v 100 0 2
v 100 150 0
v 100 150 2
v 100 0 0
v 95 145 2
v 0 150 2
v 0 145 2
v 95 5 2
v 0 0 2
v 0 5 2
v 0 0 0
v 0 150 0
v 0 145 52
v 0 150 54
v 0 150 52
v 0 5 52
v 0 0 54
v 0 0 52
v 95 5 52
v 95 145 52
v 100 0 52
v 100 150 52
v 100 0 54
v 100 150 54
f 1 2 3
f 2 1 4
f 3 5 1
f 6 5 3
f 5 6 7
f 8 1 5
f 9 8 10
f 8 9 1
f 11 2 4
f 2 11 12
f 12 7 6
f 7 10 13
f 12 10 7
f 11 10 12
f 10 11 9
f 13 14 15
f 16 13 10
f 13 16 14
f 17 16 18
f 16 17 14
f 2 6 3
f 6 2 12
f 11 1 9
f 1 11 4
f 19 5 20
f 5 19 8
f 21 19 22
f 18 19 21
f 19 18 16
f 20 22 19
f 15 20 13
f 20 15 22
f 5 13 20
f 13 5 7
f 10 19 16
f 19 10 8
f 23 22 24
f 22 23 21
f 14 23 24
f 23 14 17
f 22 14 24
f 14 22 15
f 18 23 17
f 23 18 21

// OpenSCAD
//Customizable Book - to demonstrate basics of OpenSCAD for the Open Source Lab book
// Right now most 3d printers can only print 1 color -- soon you will be able to map the attached image onto this book design.

//Width of book
w=100; 
// Length of book
l=150; 
//Cover thicknes of book
c= 2;  
//Thickness of book
t= 50; 
// Page inset
i=5; 

module book (){
cube([w,l,c]); //book cover
translate([0,i,c])cube([w-i,l-i*2,t]); //pages
translate([0,0,c+t])cube([w,l,c]); //book cover
}

book();
